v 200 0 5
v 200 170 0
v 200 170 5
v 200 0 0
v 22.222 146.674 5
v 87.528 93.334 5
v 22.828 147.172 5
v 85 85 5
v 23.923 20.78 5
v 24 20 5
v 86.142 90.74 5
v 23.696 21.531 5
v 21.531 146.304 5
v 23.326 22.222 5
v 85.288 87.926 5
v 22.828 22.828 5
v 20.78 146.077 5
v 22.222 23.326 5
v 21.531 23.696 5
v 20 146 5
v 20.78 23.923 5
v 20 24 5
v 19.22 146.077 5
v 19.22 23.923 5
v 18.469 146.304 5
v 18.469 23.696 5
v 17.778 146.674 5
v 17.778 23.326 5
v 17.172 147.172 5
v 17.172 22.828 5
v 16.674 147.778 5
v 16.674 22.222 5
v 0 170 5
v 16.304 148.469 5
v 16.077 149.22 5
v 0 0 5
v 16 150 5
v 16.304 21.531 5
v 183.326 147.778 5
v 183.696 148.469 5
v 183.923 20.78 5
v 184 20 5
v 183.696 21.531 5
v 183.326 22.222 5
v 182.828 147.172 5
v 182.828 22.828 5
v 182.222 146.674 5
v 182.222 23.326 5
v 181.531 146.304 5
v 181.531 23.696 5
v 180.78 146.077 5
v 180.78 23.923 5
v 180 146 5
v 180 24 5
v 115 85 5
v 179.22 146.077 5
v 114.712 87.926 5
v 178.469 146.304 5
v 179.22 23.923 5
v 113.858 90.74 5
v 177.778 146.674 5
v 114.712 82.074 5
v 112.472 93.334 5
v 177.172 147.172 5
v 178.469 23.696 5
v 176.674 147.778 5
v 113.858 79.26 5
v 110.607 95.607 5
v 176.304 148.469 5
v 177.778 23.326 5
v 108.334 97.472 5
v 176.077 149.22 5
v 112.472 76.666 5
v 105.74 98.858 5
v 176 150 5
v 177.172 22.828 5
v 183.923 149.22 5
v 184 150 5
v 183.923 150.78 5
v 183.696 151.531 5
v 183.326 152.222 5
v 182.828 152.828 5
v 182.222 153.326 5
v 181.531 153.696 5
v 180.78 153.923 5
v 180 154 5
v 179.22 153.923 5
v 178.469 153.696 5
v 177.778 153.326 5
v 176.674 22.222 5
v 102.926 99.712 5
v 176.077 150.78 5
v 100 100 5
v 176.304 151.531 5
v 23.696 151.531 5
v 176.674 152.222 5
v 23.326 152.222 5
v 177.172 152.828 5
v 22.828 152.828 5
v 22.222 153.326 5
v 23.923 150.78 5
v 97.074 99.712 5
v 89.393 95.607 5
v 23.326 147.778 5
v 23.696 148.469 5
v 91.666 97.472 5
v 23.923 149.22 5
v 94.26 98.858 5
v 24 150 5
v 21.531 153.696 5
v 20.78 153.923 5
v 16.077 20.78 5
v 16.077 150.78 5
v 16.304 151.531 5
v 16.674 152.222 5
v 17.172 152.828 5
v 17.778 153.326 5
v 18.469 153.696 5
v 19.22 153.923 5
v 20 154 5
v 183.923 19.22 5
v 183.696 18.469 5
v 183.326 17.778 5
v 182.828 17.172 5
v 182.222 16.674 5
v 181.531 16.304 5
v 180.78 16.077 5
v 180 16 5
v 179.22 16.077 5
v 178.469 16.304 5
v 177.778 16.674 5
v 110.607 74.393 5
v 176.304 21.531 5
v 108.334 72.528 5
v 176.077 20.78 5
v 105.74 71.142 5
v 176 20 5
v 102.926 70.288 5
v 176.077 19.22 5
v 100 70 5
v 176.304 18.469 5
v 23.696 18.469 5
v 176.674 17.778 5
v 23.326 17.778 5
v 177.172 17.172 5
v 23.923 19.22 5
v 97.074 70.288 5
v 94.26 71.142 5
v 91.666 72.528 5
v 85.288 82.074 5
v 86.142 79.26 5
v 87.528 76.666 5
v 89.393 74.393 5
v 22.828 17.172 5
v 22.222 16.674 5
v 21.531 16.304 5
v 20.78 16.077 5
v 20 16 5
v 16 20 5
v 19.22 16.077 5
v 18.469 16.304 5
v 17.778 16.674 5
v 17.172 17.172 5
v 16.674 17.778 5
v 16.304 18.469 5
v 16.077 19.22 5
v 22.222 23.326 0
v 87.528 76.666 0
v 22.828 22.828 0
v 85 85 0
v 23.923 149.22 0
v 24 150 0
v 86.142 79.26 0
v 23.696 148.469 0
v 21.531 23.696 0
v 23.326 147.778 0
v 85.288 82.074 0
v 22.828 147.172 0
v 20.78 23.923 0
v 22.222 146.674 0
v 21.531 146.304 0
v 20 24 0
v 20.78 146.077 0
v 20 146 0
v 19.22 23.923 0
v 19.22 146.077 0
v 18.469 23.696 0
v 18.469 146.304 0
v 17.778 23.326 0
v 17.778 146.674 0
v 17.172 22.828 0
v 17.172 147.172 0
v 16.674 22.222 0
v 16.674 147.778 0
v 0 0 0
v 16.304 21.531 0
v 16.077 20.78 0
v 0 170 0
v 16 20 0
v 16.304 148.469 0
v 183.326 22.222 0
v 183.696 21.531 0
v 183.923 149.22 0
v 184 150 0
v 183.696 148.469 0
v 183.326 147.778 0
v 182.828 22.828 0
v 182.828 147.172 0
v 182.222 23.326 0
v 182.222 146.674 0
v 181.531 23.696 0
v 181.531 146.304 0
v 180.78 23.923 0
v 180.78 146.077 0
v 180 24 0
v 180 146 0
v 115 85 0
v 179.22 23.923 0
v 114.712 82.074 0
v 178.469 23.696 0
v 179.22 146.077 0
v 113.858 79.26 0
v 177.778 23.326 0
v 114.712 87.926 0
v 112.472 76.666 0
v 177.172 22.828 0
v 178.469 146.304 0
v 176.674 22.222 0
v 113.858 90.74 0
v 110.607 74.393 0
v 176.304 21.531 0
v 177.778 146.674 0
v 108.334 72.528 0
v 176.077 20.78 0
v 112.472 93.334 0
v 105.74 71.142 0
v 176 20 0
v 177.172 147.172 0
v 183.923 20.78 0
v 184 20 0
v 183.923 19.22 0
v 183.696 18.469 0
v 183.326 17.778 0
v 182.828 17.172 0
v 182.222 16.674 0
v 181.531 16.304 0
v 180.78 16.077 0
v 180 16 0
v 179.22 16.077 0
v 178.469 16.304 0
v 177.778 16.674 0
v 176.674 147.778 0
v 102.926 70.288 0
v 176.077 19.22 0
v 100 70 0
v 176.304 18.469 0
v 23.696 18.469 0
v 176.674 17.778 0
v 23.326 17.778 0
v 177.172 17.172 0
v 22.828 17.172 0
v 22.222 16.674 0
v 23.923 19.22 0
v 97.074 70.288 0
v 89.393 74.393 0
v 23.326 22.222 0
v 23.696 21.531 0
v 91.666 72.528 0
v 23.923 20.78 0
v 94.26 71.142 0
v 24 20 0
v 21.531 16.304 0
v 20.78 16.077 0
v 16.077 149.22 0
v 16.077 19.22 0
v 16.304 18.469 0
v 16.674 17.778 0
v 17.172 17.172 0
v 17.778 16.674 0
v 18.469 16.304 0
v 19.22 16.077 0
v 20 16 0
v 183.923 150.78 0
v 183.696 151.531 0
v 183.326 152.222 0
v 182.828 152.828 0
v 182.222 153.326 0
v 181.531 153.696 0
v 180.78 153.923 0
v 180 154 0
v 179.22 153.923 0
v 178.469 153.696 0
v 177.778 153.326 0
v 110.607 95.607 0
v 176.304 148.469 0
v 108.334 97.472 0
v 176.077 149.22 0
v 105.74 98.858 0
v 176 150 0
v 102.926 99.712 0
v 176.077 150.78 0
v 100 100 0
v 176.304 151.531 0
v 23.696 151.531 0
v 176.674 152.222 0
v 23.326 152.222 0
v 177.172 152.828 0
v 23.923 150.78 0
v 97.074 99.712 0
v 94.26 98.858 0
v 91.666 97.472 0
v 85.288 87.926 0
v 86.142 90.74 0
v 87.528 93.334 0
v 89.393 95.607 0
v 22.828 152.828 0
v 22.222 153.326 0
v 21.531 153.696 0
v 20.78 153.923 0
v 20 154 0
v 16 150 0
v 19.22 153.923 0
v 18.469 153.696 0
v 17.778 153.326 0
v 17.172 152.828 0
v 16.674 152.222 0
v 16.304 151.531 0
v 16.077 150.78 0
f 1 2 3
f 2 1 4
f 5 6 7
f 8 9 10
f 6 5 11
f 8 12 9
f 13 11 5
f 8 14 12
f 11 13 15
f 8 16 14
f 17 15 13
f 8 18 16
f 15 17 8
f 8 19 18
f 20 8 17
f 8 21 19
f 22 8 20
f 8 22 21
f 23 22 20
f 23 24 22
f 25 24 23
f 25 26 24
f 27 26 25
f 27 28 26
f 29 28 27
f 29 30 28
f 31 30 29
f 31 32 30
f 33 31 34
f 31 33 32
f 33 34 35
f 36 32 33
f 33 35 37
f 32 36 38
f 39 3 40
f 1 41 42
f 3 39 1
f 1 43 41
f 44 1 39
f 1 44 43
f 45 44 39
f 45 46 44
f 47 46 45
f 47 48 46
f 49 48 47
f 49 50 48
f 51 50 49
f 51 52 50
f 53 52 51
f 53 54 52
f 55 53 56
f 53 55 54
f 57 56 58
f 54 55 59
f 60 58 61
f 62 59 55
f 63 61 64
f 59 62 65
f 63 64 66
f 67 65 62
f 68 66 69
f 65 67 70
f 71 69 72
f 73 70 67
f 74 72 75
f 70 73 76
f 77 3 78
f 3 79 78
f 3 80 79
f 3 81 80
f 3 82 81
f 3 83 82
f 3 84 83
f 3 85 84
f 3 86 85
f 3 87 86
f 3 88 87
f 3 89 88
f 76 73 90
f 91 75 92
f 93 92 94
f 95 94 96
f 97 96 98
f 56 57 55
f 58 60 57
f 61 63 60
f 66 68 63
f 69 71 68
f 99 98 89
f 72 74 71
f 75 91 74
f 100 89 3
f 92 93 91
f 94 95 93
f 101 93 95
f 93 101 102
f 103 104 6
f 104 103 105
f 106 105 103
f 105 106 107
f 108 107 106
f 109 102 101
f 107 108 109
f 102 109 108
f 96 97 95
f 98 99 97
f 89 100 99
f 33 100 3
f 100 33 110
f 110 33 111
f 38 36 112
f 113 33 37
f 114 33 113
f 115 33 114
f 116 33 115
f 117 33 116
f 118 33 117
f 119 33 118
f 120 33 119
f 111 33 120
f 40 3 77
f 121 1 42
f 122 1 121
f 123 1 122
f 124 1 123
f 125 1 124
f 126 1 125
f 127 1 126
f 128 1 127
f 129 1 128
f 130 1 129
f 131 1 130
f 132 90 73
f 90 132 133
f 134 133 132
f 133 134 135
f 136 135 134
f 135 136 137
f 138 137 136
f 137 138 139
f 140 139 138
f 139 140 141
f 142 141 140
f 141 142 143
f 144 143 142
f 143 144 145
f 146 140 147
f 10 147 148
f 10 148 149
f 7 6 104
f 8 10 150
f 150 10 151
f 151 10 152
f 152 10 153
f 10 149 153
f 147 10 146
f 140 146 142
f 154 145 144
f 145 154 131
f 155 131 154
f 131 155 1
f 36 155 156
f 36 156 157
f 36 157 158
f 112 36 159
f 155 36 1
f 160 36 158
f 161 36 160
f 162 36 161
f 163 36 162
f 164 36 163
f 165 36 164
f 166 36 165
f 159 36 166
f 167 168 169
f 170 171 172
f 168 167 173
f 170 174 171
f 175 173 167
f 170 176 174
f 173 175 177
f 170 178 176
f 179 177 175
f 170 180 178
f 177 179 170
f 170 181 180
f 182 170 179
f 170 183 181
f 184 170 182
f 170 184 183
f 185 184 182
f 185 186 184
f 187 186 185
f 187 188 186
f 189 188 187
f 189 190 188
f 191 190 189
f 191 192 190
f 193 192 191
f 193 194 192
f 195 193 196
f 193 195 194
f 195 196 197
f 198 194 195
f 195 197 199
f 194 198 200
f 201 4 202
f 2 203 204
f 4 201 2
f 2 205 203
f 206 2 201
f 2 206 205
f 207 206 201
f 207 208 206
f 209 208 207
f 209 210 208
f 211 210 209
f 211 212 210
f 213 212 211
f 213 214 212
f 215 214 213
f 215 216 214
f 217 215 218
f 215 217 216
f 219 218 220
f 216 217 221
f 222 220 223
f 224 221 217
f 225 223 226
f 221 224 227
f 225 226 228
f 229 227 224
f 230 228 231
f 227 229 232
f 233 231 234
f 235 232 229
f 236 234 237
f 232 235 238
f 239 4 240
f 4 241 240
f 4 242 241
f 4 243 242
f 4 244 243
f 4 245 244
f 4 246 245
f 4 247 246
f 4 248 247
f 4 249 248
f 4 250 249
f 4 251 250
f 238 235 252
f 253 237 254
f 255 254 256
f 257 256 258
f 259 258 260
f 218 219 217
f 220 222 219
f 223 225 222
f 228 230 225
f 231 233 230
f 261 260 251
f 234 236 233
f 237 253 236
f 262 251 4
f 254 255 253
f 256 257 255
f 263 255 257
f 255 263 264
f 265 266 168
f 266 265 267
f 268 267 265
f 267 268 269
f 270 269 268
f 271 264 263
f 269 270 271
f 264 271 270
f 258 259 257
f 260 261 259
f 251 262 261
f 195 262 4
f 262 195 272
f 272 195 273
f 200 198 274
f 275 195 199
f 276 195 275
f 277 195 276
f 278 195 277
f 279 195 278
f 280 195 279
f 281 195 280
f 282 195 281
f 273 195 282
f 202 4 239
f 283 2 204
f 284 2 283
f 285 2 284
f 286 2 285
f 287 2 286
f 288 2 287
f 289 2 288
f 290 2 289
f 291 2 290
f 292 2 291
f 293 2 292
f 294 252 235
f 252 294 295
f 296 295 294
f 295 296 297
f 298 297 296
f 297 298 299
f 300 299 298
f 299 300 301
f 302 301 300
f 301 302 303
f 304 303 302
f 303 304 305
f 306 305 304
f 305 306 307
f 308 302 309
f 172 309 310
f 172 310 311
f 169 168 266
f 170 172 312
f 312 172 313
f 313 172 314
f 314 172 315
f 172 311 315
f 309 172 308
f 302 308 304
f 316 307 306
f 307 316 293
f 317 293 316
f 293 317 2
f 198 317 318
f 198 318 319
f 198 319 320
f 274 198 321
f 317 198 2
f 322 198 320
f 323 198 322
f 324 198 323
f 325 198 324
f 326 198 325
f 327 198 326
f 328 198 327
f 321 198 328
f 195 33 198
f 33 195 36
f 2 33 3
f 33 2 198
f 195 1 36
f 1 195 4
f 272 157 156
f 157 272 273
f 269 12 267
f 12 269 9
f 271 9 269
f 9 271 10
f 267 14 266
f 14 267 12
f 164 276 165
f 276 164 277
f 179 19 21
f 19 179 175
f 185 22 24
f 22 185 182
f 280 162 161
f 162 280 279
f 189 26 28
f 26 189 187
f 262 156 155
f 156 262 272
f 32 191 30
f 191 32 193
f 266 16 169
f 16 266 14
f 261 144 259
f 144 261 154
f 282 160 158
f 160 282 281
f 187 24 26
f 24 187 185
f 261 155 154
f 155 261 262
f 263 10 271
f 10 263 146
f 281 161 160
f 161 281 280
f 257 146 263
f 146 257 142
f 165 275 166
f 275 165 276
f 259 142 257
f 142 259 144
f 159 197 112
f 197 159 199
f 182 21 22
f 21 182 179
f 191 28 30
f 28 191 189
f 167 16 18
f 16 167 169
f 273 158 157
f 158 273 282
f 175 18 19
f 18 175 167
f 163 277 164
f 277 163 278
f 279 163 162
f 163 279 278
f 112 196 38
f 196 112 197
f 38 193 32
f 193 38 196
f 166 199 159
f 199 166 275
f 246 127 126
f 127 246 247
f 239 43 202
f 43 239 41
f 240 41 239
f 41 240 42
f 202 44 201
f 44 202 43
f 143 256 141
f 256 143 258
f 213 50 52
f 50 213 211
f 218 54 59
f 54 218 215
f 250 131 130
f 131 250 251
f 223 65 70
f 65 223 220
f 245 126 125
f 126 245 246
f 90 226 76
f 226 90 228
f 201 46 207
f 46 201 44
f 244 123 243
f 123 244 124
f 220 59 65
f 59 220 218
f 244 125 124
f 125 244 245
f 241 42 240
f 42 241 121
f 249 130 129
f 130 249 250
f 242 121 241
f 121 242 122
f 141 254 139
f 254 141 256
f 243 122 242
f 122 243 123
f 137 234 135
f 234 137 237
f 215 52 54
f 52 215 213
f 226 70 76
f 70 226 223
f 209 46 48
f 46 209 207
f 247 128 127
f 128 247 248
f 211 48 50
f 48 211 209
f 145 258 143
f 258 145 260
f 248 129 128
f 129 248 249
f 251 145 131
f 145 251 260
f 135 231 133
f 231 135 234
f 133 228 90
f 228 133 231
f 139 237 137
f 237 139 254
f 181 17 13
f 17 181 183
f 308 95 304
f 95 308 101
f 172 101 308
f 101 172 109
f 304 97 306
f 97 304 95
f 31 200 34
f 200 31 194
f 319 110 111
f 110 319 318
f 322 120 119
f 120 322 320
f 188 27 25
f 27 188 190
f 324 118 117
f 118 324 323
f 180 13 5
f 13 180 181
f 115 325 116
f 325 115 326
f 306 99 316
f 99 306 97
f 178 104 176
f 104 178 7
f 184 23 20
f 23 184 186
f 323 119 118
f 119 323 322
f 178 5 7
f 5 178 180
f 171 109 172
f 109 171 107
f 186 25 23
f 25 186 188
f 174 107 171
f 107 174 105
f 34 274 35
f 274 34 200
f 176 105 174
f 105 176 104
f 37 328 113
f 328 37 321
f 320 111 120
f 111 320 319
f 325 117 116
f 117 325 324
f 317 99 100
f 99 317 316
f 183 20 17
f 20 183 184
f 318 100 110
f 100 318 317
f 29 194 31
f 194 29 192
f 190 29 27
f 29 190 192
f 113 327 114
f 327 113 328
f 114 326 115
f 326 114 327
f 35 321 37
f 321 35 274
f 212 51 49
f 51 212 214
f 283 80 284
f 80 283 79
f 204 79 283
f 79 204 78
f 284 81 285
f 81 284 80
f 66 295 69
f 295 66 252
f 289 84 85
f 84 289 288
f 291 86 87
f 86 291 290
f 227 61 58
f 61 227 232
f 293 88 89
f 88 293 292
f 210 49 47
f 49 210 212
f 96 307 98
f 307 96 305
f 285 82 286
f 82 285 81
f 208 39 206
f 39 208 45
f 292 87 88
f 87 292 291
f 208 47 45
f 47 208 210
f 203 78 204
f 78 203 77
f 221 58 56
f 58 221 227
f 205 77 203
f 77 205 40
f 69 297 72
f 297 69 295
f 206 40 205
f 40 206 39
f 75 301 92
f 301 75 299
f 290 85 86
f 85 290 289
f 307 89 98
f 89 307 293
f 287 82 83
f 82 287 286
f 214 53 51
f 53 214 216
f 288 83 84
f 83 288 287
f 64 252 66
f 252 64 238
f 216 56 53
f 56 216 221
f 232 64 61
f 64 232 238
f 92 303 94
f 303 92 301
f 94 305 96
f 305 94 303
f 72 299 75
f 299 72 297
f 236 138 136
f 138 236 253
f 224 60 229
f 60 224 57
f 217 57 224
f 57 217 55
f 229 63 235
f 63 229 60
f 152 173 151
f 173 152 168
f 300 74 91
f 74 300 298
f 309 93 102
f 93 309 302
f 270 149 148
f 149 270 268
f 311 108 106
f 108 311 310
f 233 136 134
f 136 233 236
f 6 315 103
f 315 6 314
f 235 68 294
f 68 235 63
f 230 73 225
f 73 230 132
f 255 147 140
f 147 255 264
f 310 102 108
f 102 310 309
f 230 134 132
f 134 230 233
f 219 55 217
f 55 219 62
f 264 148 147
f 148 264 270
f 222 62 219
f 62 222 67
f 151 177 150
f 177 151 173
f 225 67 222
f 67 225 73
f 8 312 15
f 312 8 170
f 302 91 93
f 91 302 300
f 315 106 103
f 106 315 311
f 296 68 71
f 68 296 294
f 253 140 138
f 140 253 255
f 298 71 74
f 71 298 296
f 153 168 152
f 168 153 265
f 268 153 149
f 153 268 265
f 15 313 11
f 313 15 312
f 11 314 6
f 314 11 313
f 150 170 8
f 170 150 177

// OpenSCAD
$fn = 32;

// ----------------------------------------------------------------------
// Big plate: 200-250 mm adapter plate
// ----------------------------------------------------------------------

// --- parameters (mm) ---
plate_l = 200;            // plate length, X
plate_w = 170;            // plate width, Y
plate_t = 5;              // plate thickness, Z
corner_d = 8;             // corner hole diameter
corner_in = 20;           // corner hole inset from the edges
bore_d = 30;              // central bore

difference() {
  cube([plate_l, plate_w, plate_t]);
  translate([corner_in, corner_in, -1]) cylinder(h = plate_t + 2, d = corner_d);
  translate([plate_l - corner_in, corner_in, -1]) cylinder(h = plate_t + 2, d = corner_d);
  translate([corner_in, plate_w - corner_in, -1]) cylinder(h = plate_t + 2, d = corner_d);
  translate([plate_l - corner_in, plate_w - corner_in, -1]) cylinder(h = plate_t + 2, d = corner_d);
  translate([plate_l / 2, plate_w / 2, -1]) cylinder(h = plate_t + 2, d = bore_d);
}
